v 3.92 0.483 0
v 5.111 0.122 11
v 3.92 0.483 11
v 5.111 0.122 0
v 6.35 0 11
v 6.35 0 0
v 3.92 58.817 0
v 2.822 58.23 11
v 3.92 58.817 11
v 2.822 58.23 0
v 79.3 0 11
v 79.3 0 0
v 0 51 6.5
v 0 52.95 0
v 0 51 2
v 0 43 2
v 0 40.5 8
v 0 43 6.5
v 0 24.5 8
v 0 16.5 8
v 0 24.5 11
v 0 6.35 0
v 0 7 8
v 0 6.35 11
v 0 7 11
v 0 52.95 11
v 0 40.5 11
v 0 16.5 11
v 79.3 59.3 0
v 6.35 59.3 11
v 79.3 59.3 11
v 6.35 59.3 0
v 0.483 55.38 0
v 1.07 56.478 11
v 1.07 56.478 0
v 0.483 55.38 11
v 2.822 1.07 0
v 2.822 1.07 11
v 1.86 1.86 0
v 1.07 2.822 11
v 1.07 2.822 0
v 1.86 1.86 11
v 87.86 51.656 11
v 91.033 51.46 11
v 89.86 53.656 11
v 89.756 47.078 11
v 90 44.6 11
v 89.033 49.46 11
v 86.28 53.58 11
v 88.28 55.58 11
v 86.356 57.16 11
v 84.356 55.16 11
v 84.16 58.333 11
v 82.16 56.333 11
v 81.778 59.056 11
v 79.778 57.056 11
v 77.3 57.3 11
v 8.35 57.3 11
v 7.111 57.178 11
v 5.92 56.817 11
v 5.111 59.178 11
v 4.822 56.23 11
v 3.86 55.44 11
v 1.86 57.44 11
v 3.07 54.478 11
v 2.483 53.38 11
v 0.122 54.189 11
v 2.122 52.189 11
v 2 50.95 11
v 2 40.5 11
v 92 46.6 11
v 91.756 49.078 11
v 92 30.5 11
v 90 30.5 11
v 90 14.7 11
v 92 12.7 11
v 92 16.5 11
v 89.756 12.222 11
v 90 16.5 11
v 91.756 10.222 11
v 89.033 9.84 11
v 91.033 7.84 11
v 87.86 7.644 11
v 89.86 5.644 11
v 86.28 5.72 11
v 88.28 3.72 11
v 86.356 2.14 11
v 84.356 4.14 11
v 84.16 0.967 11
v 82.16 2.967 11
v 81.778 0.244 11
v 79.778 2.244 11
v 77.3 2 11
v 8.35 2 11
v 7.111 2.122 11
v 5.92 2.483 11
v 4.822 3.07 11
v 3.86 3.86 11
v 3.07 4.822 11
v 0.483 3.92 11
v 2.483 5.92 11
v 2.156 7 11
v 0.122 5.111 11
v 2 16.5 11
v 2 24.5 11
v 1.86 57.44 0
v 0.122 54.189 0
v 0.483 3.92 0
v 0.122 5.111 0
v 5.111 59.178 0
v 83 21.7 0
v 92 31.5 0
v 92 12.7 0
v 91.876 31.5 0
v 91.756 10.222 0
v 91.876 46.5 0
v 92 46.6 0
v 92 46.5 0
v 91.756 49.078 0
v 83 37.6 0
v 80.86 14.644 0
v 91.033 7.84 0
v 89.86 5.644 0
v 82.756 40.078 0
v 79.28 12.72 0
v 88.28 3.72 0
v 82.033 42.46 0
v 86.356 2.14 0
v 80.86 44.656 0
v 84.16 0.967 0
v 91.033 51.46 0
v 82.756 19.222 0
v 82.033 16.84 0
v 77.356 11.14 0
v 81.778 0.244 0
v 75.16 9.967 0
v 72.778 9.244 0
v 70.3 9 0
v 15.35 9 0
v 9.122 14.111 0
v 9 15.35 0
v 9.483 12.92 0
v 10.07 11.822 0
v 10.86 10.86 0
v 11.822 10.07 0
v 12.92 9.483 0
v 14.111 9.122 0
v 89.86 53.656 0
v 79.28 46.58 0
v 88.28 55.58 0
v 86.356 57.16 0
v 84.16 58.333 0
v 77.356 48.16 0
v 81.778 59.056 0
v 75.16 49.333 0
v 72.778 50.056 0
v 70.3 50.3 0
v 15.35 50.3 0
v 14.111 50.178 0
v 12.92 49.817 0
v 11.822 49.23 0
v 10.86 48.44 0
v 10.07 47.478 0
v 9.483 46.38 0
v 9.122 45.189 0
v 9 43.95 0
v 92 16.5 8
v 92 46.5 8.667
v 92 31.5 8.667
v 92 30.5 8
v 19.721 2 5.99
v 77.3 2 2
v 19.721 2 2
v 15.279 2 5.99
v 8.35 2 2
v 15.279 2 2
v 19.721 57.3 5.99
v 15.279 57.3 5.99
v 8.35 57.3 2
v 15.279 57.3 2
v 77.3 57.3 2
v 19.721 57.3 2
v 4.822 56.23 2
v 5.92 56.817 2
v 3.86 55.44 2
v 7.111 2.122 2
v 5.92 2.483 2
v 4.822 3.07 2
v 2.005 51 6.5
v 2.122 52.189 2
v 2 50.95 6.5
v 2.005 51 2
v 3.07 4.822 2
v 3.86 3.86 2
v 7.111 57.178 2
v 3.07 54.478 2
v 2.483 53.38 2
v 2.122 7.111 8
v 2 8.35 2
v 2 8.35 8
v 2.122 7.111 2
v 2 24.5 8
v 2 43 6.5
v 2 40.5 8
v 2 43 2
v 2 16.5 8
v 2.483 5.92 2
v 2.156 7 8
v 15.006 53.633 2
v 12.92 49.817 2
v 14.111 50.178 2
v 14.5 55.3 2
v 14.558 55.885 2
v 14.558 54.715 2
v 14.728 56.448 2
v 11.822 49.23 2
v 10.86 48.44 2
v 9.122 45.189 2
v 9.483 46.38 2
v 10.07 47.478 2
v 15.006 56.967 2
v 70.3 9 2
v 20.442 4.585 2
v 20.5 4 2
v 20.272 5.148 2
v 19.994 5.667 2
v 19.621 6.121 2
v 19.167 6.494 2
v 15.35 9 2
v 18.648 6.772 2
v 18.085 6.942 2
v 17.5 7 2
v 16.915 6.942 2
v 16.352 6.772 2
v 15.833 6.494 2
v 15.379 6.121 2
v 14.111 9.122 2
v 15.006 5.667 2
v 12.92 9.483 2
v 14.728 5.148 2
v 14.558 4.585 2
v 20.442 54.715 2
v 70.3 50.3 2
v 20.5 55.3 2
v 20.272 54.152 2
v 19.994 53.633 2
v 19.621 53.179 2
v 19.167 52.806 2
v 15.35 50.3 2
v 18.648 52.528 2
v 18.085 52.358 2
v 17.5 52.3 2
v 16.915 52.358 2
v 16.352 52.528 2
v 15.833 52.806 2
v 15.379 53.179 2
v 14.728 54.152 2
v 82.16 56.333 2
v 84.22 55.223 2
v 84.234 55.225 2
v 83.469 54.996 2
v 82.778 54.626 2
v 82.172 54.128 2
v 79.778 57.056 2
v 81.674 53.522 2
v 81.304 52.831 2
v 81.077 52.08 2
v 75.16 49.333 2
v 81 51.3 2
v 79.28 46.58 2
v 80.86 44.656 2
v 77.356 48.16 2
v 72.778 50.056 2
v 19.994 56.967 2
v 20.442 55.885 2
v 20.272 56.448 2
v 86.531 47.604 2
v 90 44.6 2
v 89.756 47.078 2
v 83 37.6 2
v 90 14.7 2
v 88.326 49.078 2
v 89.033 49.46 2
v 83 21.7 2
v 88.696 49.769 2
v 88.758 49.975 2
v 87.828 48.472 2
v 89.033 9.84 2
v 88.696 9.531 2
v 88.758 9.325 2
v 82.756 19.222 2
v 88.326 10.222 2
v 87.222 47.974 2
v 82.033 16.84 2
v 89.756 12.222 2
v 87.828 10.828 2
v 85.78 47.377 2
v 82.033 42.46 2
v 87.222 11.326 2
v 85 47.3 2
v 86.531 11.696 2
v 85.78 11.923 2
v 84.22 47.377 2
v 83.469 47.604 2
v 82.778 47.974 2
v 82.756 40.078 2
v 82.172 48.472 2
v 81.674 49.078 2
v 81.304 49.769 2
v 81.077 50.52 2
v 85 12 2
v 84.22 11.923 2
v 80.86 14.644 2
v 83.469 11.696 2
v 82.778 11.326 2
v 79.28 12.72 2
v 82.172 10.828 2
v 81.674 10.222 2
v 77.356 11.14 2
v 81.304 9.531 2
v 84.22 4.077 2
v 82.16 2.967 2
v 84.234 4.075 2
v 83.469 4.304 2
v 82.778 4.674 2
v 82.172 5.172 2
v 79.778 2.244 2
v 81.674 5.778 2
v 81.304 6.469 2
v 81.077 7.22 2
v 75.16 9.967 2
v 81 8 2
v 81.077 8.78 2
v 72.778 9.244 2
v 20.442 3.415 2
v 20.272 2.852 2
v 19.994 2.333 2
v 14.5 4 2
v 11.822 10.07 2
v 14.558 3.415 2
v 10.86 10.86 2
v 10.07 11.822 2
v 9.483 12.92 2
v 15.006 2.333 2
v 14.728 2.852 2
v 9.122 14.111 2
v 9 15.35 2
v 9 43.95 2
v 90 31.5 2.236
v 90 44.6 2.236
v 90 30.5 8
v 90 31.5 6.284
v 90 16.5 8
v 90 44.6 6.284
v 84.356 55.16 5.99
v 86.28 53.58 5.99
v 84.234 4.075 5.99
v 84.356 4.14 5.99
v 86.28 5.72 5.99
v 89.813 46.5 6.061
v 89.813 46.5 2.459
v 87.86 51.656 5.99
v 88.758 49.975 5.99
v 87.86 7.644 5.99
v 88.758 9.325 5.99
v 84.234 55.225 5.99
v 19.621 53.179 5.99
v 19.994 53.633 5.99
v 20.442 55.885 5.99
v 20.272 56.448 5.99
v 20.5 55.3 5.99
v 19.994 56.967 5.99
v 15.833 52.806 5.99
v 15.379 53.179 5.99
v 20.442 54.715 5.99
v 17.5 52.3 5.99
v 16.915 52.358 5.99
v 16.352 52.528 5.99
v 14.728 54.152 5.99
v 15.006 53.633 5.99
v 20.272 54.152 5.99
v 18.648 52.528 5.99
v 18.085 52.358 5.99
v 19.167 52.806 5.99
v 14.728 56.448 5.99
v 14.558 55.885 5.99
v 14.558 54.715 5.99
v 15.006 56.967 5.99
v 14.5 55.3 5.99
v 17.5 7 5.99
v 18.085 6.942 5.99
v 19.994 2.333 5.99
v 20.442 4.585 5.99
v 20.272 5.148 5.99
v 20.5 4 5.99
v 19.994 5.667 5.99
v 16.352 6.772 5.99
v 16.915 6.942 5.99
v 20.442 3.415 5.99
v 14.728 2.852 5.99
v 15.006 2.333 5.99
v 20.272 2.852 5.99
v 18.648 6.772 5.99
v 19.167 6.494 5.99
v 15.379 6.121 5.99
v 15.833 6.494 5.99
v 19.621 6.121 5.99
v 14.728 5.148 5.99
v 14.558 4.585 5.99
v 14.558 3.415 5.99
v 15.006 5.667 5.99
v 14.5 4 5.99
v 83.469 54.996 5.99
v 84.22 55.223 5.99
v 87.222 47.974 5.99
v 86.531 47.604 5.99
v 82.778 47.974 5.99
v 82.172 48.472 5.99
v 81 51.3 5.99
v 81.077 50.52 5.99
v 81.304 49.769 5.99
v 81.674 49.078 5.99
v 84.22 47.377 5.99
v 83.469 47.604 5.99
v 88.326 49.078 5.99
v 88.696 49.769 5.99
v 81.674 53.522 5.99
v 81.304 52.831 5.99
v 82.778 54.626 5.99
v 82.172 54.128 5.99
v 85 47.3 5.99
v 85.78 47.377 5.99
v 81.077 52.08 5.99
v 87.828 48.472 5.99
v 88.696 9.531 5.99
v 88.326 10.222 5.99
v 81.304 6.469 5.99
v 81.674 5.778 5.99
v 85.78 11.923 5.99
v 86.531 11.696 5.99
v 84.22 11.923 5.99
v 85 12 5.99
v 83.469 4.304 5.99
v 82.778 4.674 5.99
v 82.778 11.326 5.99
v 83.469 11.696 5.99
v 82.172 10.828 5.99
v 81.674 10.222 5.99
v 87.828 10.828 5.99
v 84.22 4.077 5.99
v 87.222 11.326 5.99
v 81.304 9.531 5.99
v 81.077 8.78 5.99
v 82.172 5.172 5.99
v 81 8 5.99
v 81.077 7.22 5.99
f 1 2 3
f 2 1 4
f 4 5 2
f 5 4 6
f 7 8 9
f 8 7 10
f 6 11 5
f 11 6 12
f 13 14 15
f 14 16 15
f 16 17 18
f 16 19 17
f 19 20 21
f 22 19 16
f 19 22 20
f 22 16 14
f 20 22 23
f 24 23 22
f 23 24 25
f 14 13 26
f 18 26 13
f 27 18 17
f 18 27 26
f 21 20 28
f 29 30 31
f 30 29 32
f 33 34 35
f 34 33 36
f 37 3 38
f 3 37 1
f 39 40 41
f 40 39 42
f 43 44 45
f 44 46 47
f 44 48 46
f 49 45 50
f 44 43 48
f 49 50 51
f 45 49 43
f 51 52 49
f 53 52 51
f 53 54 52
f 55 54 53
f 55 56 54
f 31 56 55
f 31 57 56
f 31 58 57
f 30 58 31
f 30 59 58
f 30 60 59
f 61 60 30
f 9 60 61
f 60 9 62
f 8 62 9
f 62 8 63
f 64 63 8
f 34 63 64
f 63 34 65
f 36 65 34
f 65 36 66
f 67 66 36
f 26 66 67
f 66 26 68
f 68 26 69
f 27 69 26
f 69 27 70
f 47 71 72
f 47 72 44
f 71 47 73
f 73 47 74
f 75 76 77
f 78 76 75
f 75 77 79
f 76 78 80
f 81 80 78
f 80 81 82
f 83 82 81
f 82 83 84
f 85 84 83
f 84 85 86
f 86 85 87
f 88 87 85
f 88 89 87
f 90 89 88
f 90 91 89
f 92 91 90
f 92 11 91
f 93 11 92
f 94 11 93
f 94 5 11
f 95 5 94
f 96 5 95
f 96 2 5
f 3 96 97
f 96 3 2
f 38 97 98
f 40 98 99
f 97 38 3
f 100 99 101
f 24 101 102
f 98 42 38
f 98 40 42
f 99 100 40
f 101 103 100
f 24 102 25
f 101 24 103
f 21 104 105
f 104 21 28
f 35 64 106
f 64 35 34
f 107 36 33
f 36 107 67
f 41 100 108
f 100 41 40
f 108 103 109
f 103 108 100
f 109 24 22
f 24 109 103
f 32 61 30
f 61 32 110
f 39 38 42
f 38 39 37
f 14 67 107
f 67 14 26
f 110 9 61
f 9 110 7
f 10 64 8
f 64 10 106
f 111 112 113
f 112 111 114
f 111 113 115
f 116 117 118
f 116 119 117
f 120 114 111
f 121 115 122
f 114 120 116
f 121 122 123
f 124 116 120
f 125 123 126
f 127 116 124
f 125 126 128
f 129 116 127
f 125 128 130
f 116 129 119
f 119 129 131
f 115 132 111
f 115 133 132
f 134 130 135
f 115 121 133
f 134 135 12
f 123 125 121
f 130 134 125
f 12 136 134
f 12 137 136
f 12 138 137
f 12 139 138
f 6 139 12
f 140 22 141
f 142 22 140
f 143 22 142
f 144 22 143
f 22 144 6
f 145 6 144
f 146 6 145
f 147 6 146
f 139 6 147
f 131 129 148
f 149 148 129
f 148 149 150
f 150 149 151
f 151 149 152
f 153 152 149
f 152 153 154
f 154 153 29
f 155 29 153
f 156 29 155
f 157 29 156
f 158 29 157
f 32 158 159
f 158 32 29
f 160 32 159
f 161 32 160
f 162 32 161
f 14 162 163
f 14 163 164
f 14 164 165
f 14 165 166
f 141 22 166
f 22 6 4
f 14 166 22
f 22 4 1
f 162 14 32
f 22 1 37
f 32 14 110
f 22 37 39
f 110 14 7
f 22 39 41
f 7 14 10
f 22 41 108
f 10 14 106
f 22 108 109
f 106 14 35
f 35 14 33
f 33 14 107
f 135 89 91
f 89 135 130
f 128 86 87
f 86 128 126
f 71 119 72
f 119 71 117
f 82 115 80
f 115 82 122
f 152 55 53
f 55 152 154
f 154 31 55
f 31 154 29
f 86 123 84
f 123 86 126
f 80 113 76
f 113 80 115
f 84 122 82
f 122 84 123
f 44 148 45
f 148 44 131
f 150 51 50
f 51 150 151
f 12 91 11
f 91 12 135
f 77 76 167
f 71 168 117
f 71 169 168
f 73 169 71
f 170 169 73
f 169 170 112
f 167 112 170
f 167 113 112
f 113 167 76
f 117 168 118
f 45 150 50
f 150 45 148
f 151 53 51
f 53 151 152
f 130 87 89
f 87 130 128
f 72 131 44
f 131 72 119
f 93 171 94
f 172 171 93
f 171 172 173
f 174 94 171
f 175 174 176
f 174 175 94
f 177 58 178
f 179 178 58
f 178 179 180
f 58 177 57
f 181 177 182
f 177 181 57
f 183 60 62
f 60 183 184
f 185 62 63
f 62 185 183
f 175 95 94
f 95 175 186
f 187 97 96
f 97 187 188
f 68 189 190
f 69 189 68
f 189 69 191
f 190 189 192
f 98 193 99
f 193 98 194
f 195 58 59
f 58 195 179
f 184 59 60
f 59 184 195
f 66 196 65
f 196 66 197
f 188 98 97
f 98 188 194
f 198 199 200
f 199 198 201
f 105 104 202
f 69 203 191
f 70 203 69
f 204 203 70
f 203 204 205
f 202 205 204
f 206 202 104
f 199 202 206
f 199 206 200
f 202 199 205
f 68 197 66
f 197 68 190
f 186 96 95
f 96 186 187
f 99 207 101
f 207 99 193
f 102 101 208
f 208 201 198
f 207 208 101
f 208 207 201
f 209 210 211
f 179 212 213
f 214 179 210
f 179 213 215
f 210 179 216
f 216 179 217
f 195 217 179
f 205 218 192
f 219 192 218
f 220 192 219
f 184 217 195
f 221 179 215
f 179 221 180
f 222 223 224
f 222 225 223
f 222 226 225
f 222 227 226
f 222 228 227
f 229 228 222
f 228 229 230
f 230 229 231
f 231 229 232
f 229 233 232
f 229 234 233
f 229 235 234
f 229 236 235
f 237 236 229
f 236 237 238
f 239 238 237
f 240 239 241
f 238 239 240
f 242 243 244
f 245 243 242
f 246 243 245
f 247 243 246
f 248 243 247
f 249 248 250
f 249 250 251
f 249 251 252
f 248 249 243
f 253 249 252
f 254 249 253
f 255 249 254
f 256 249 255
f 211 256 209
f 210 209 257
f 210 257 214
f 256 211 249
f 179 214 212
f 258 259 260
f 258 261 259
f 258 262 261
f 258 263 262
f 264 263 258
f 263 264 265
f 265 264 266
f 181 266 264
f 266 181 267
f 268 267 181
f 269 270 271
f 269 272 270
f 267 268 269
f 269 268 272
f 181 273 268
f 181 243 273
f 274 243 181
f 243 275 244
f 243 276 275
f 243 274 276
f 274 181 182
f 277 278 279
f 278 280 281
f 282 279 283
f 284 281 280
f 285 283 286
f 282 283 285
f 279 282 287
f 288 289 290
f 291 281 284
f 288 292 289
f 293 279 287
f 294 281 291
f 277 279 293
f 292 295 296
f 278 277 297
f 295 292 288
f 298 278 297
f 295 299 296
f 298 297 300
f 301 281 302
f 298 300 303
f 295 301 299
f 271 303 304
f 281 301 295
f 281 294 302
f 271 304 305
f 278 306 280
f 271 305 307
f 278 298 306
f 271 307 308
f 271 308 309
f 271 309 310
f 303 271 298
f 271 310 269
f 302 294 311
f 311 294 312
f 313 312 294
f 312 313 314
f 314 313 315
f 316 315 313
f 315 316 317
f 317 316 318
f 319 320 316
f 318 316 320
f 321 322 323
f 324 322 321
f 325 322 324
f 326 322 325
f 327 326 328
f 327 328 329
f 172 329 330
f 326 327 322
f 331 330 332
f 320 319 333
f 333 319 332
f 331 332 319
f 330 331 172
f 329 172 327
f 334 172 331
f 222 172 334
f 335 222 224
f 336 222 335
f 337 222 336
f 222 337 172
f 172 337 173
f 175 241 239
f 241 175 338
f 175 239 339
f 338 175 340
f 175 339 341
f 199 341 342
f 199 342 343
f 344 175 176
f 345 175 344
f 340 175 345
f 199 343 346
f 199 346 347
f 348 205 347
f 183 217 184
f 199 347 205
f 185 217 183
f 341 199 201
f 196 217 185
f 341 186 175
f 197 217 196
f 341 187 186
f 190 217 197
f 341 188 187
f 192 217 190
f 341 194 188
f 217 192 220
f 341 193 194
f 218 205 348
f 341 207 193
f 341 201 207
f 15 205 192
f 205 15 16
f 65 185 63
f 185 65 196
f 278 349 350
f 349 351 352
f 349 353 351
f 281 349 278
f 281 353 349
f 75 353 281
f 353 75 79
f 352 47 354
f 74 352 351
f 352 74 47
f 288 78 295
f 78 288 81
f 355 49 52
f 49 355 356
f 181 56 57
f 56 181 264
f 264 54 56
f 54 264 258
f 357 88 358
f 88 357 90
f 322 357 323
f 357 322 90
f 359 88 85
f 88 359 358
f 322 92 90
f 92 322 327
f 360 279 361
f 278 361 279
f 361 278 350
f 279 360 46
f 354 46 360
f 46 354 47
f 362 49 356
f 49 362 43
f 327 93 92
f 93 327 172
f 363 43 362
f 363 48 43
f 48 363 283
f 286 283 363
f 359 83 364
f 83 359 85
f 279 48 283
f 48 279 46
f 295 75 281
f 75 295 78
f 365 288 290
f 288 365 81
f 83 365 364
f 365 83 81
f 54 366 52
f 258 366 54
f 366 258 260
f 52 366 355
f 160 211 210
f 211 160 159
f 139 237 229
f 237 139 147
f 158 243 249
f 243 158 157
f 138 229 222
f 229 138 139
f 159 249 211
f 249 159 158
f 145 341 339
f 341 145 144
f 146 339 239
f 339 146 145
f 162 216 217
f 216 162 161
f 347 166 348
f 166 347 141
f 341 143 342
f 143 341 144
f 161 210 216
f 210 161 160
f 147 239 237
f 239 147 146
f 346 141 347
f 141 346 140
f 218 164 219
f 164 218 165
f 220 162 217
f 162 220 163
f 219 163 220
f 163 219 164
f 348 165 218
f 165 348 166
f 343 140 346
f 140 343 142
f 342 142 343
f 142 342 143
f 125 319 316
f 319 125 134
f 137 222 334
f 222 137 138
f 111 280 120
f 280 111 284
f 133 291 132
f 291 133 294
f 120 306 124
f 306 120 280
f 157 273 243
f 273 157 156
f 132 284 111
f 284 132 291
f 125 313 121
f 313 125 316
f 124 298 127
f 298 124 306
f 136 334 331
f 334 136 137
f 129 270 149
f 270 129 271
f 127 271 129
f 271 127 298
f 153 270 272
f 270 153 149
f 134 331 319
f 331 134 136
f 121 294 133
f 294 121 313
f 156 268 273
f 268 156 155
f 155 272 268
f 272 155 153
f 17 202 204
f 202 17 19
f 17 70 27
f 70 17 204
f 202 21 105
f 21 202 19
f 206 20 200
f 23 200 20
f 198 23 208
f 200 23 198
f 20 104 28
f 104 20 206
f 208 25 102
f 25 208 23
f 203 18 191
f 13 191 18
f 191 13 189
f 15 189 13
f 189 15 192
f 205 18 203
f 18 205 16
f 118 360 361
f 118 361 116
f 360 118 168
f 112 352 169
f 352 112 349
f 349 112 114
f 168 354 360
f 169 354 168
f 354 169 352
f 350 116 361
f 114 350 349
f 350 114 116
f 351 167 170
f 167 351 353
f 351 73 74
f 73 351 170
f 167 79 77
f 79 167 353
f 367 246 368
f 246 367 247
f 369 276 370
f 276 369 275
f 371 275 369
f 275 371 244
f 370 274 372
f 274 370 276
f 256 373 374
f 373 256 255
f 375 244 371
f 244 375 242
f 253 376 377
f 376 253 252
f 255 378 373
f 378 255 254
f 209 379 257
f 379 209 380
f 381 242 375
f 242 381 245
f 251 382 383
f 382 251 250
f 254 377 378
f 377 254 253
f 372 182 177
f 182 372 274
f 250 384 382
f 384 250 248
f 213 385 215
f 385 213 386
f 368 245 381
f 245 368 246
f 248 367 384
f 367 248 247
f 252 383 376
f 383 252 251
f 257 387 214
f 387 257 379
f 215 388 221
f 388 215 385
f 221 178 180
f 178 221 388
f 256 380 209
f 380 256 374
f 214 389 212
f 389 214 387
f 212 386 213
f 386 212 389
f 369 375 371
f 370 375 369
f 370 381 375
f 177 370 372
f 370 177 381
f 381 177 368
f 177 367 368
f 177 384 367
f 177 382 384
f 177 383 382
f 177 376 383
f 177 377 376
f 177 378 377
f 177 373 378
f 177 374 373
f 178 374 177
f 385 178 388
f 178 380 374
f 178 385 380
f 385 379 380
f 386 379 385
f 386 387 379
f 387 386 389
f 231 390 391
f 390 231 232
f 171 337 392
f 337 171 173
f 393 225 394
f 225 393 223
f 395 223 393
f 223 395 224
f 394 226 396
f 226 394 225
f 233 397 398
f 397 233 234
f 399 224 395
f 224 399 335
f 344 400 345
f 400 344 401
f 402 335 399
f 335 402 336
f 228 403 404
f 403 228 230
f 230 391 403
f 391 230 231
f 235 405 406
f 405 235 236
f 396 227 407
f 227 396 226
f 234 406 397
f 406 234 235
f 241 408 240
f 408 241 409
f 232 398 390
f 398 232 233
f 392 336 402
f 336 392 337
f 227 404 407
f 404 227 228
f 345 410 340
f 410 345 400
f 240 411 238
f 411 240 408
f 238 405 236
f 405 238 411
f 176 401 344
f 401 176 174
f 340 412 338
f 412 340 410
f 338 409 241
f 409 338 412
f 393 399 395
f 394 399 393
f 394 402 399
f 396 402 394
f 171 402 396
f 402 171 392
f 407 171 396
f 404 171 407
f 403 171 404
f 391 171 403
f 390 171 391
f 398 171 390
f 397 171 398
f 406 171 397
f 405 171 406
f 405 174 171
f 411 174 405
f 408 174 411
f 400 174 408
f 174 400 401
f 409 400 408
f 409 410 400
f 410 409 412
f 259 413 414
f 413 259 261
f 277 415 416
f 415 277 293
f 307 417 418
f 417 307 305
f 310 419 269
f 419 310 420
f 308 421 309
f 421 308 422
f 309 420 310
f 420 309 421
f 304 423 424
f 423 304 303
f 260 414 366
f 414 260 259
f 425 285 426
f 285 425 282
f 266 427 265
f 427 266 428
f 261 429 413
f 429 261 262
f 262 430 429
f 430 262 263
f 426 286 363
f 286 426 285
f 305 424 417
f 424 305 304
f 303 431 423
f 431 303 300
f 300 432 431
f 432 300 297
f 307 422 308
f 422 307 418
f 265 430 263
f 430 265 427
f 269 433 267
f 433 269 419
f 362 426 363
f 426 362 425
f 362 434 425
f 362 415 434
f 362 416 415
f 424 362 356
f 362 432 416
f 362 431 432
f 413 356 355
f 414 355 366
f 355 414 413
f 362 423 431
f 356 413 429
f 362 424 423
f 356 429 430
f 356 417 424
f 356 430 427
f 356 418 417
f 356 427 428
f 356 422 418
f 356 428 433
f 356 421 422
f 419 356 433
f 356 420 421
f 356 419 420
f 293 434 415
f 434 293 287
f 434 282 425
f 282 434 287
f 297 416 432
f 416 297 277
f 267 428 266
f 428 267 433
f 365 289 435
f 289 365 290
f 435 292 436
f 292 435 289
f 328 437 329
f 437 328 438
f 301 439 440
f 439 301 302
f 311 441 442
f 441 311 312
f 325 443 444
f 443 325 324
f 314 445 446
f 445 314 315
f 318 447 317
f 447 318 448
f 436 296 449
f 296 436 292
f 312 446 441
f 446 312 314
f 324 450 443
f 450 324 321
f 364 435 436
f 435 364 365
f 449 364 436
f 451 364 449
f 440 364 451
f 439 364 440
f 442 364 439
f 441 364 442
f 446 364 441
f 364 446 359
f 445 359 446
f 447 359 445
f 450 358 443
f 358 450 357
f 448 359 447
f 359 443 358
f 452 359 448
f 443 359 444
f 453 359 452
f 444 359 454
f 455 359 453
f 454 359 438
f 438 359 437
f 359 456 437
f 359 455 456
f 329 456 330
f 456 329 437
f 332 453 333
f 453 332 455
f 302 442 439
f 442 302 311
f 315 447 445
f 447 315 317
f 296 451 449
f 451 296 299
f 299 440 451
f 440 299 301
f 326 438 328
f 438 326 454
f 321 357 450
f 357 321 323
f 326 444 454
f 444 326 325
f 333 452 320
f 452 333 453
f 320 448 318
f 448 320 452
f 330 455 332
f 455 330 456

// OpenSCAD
// Fancy box for beagleboard, (c) 2010,2011 - Koen Kooi, licensed under CC-BY-SA

// Conventions: width = x, length = y, height = z

// width of PCB
inside_width = 88;

// lenght of PCB
inside_length = 55.3;

// outside wall thickness
edge_thickness = 2;
bottom_thickness = 1;
border_size = edge_thickness + 5;

base_height = 10;

// Number of facets in curves, 32 is a good tradeoff between looks and processing speed
$fn=32;

// helper sizes, disable for final rendering
//color([0,0,1]) helper(inside_width,inside_length,edge_thickness);

translate(v=[0,0,0]) box(inside_width, inside_length, bottom_thickness, base_height, border_size, edge_thickness);


module helper(inside_width,inside_length,edge_thickness) {
	translate(v=[edge_thickness,edge_thickness,-edge_thickness*2]) cube([inside_width,inside_length,edge_thickness], center=false);
	translate(v=[edge_thickness,edge_thickness,20]) cube([edge_thickness,inside_length,edge_thickness], center=false);
}


module box(iw, il, bt, base_height, bs, et ) {
	// mini usb height
	sh=4;
	pcbt= 2;
	extra_height = 0;

	box_length = il + 2*et;
	box_width = iw + 2*et;
	box_height = base_height + extra_height;

	radius=25.4/4;
	radius2=25.4/2;

	difference() {
		// outside part
		union() {
			// the corner radii are different, so we build it in 2 parts using intersection()
			intersection() {
				minkowski(){
					translate(v=[radius, radius, 0]) cube([iw - 2 * radius + 2*et ,il - 2 * radius + 2*et, box_height], center=false);
					cylinder(r=radius,h=1);
				}
				translate(v=[-et/2,-et/2, -box_height* 0.3]) cube([box_width/2 + 2*et, box_length * 1.1, box_height * 1.5]);	
			}
		
			// the corner radii are different, so we build it in 2 parts using intersection()
			intersection() {
				minkowski(){
					translate(v=[radius2, radius2, 0]) cube([iw - 2 * radius2 + 2*et ,il - 2 * radius2 + 2*et, box_height], center=false);
					cylinder(r=radius2,h=1);
				}
				translate(v=[iw/2 ,-et/2, -box_height* 0.3]) cube([box_width/2 + 2*et, box_length * 1.1, box_height * 1.5]);	
			}
		}

		// inside part
		translate(v=[et, et, et]) union() {
			// the corner radii are different, so we build it in 2 parts using intersection()
			intersection() {
				minkowski(){
					translate(v=[radius, radius, 0]) cube([iw - 2 * radius,il - 2 * radius, box_height], center=false);
					cylinder(r=radius,h=1);
				}
				translate(v=[-et/2,-et/2, -box_height* 0.3]) cube([box_width/2 + 2*et, box_length * 1.1, box_height * 1.5]);	
			}
		
			// the corner radii are different, so we build it in 2 parts using intersection()
			intersection() {
				minkowski(){
					translate(v=[radius2, radius2, 0]) cube([iw - 2 * radius2,il - 2 * radius2, box_height], center=false);
					cylinder(r=radius2,h=1);
				}
				translate(v=[iw/2 ,-et/2, -box_height* 0.3]) cube([box_width/2 + 2*et, box_length * 1.1, box_height * 1.5]);	
			}
		}

		// bottom cutout
		translate(v=[et + bs, et + bs, -et]) union() {
			// the corner radii are different, so we build it in 2 parts using intersection()
			intersection() {
				minkowski(){
					translate(v=[radius, radius, 0]) cube([iw - 2 * radius - 2*bs,il - 2 * radius - 2*bs, box_height], center=false);
					cylinder(r=radius,h=1);
				}
				translate(v=[-et/2,-et/2, -box_height* 0.3]) cube([box_width/2 + 2*et, box_length * 1.1, box_height * 1.5]);	
			}
		
			// the corner radii are different, so we build it in 2 parts using intersection()
			intersection() {
				minkowski(){
					translate(v=[radius2, radius2, 0]) cube([iw - 2 * radius2 - 2*bs ,il - 2 * radius2 - 2*bs, box_height], center=false);
					cylinder(r=radius2,h=1);
				}
				translate(v=[iw/2 ,-et/2, -box_height* 0.3]) cube([box_width/2 + 2*et, box_length * 1.1, box_height * 1.5]);	
			}
		}

			
      //ethernet
	
		translate(v=[et,et,et]) {
		     translate(v = [-et -0.01, 22.5, + sh + pcbt]) {
		       cube([et*3, 16, 20], center=false);
		     }
		     //power
		     translate(v = [-et -0.01, 5, sh + pcbt]) {
		       cube([et *2, 9.5, 20], center=false);
		     }
		
		     //mini-USB
		     translate(v = [-et + -0.01, 41, 0 ]) {
		       cube([et *2, 8, 4.5], center=false);
		     }
		
		      //microsd: 15mm long, 29.5mm corner offset
		     translate(v = [iw  -0.01, 29.5, sh - 1.5 *pcbt]) {
		        cube([et *2, 15, pcbt * 1.5], center=false);
		     }
		     translate(v = [iw  +2,  29.5, 1+sh - 1.5 *pcbt]) rotate(a=[0,-50,0]) {
		        cube([et *2, 15, pcbt * 1.5], center=false);
		     }	
		     translate(v = [iw -1.9 ,  29.5, +sh-1.5]) rotate(a=[0,50,0]) {
		        cube([et *3, 15, 4], center=false);
		     }	
		      //USB
		     translate(v = [iw +0.01 - et, 14.5 , sh + pcbt]) {
		        cube([et *3, 14, 20], center=false);
		     }
		}

	}
	translate(v=[et,et,et]) {
		translate(v = [ +15.5, il -2,-0.01]) cylinder(r=3,h=sh);
		translate(v = [ +15.5,  +2,-0.01]) cylinder(r=3,h=sh);
		translate(v = [iw -5, il -6,-0.01]) cylinder(r=4,h=sh);
		translate(v = [iw -5,  +6,-0.01]) cylinder(r=4,h=sh);
	}

}
